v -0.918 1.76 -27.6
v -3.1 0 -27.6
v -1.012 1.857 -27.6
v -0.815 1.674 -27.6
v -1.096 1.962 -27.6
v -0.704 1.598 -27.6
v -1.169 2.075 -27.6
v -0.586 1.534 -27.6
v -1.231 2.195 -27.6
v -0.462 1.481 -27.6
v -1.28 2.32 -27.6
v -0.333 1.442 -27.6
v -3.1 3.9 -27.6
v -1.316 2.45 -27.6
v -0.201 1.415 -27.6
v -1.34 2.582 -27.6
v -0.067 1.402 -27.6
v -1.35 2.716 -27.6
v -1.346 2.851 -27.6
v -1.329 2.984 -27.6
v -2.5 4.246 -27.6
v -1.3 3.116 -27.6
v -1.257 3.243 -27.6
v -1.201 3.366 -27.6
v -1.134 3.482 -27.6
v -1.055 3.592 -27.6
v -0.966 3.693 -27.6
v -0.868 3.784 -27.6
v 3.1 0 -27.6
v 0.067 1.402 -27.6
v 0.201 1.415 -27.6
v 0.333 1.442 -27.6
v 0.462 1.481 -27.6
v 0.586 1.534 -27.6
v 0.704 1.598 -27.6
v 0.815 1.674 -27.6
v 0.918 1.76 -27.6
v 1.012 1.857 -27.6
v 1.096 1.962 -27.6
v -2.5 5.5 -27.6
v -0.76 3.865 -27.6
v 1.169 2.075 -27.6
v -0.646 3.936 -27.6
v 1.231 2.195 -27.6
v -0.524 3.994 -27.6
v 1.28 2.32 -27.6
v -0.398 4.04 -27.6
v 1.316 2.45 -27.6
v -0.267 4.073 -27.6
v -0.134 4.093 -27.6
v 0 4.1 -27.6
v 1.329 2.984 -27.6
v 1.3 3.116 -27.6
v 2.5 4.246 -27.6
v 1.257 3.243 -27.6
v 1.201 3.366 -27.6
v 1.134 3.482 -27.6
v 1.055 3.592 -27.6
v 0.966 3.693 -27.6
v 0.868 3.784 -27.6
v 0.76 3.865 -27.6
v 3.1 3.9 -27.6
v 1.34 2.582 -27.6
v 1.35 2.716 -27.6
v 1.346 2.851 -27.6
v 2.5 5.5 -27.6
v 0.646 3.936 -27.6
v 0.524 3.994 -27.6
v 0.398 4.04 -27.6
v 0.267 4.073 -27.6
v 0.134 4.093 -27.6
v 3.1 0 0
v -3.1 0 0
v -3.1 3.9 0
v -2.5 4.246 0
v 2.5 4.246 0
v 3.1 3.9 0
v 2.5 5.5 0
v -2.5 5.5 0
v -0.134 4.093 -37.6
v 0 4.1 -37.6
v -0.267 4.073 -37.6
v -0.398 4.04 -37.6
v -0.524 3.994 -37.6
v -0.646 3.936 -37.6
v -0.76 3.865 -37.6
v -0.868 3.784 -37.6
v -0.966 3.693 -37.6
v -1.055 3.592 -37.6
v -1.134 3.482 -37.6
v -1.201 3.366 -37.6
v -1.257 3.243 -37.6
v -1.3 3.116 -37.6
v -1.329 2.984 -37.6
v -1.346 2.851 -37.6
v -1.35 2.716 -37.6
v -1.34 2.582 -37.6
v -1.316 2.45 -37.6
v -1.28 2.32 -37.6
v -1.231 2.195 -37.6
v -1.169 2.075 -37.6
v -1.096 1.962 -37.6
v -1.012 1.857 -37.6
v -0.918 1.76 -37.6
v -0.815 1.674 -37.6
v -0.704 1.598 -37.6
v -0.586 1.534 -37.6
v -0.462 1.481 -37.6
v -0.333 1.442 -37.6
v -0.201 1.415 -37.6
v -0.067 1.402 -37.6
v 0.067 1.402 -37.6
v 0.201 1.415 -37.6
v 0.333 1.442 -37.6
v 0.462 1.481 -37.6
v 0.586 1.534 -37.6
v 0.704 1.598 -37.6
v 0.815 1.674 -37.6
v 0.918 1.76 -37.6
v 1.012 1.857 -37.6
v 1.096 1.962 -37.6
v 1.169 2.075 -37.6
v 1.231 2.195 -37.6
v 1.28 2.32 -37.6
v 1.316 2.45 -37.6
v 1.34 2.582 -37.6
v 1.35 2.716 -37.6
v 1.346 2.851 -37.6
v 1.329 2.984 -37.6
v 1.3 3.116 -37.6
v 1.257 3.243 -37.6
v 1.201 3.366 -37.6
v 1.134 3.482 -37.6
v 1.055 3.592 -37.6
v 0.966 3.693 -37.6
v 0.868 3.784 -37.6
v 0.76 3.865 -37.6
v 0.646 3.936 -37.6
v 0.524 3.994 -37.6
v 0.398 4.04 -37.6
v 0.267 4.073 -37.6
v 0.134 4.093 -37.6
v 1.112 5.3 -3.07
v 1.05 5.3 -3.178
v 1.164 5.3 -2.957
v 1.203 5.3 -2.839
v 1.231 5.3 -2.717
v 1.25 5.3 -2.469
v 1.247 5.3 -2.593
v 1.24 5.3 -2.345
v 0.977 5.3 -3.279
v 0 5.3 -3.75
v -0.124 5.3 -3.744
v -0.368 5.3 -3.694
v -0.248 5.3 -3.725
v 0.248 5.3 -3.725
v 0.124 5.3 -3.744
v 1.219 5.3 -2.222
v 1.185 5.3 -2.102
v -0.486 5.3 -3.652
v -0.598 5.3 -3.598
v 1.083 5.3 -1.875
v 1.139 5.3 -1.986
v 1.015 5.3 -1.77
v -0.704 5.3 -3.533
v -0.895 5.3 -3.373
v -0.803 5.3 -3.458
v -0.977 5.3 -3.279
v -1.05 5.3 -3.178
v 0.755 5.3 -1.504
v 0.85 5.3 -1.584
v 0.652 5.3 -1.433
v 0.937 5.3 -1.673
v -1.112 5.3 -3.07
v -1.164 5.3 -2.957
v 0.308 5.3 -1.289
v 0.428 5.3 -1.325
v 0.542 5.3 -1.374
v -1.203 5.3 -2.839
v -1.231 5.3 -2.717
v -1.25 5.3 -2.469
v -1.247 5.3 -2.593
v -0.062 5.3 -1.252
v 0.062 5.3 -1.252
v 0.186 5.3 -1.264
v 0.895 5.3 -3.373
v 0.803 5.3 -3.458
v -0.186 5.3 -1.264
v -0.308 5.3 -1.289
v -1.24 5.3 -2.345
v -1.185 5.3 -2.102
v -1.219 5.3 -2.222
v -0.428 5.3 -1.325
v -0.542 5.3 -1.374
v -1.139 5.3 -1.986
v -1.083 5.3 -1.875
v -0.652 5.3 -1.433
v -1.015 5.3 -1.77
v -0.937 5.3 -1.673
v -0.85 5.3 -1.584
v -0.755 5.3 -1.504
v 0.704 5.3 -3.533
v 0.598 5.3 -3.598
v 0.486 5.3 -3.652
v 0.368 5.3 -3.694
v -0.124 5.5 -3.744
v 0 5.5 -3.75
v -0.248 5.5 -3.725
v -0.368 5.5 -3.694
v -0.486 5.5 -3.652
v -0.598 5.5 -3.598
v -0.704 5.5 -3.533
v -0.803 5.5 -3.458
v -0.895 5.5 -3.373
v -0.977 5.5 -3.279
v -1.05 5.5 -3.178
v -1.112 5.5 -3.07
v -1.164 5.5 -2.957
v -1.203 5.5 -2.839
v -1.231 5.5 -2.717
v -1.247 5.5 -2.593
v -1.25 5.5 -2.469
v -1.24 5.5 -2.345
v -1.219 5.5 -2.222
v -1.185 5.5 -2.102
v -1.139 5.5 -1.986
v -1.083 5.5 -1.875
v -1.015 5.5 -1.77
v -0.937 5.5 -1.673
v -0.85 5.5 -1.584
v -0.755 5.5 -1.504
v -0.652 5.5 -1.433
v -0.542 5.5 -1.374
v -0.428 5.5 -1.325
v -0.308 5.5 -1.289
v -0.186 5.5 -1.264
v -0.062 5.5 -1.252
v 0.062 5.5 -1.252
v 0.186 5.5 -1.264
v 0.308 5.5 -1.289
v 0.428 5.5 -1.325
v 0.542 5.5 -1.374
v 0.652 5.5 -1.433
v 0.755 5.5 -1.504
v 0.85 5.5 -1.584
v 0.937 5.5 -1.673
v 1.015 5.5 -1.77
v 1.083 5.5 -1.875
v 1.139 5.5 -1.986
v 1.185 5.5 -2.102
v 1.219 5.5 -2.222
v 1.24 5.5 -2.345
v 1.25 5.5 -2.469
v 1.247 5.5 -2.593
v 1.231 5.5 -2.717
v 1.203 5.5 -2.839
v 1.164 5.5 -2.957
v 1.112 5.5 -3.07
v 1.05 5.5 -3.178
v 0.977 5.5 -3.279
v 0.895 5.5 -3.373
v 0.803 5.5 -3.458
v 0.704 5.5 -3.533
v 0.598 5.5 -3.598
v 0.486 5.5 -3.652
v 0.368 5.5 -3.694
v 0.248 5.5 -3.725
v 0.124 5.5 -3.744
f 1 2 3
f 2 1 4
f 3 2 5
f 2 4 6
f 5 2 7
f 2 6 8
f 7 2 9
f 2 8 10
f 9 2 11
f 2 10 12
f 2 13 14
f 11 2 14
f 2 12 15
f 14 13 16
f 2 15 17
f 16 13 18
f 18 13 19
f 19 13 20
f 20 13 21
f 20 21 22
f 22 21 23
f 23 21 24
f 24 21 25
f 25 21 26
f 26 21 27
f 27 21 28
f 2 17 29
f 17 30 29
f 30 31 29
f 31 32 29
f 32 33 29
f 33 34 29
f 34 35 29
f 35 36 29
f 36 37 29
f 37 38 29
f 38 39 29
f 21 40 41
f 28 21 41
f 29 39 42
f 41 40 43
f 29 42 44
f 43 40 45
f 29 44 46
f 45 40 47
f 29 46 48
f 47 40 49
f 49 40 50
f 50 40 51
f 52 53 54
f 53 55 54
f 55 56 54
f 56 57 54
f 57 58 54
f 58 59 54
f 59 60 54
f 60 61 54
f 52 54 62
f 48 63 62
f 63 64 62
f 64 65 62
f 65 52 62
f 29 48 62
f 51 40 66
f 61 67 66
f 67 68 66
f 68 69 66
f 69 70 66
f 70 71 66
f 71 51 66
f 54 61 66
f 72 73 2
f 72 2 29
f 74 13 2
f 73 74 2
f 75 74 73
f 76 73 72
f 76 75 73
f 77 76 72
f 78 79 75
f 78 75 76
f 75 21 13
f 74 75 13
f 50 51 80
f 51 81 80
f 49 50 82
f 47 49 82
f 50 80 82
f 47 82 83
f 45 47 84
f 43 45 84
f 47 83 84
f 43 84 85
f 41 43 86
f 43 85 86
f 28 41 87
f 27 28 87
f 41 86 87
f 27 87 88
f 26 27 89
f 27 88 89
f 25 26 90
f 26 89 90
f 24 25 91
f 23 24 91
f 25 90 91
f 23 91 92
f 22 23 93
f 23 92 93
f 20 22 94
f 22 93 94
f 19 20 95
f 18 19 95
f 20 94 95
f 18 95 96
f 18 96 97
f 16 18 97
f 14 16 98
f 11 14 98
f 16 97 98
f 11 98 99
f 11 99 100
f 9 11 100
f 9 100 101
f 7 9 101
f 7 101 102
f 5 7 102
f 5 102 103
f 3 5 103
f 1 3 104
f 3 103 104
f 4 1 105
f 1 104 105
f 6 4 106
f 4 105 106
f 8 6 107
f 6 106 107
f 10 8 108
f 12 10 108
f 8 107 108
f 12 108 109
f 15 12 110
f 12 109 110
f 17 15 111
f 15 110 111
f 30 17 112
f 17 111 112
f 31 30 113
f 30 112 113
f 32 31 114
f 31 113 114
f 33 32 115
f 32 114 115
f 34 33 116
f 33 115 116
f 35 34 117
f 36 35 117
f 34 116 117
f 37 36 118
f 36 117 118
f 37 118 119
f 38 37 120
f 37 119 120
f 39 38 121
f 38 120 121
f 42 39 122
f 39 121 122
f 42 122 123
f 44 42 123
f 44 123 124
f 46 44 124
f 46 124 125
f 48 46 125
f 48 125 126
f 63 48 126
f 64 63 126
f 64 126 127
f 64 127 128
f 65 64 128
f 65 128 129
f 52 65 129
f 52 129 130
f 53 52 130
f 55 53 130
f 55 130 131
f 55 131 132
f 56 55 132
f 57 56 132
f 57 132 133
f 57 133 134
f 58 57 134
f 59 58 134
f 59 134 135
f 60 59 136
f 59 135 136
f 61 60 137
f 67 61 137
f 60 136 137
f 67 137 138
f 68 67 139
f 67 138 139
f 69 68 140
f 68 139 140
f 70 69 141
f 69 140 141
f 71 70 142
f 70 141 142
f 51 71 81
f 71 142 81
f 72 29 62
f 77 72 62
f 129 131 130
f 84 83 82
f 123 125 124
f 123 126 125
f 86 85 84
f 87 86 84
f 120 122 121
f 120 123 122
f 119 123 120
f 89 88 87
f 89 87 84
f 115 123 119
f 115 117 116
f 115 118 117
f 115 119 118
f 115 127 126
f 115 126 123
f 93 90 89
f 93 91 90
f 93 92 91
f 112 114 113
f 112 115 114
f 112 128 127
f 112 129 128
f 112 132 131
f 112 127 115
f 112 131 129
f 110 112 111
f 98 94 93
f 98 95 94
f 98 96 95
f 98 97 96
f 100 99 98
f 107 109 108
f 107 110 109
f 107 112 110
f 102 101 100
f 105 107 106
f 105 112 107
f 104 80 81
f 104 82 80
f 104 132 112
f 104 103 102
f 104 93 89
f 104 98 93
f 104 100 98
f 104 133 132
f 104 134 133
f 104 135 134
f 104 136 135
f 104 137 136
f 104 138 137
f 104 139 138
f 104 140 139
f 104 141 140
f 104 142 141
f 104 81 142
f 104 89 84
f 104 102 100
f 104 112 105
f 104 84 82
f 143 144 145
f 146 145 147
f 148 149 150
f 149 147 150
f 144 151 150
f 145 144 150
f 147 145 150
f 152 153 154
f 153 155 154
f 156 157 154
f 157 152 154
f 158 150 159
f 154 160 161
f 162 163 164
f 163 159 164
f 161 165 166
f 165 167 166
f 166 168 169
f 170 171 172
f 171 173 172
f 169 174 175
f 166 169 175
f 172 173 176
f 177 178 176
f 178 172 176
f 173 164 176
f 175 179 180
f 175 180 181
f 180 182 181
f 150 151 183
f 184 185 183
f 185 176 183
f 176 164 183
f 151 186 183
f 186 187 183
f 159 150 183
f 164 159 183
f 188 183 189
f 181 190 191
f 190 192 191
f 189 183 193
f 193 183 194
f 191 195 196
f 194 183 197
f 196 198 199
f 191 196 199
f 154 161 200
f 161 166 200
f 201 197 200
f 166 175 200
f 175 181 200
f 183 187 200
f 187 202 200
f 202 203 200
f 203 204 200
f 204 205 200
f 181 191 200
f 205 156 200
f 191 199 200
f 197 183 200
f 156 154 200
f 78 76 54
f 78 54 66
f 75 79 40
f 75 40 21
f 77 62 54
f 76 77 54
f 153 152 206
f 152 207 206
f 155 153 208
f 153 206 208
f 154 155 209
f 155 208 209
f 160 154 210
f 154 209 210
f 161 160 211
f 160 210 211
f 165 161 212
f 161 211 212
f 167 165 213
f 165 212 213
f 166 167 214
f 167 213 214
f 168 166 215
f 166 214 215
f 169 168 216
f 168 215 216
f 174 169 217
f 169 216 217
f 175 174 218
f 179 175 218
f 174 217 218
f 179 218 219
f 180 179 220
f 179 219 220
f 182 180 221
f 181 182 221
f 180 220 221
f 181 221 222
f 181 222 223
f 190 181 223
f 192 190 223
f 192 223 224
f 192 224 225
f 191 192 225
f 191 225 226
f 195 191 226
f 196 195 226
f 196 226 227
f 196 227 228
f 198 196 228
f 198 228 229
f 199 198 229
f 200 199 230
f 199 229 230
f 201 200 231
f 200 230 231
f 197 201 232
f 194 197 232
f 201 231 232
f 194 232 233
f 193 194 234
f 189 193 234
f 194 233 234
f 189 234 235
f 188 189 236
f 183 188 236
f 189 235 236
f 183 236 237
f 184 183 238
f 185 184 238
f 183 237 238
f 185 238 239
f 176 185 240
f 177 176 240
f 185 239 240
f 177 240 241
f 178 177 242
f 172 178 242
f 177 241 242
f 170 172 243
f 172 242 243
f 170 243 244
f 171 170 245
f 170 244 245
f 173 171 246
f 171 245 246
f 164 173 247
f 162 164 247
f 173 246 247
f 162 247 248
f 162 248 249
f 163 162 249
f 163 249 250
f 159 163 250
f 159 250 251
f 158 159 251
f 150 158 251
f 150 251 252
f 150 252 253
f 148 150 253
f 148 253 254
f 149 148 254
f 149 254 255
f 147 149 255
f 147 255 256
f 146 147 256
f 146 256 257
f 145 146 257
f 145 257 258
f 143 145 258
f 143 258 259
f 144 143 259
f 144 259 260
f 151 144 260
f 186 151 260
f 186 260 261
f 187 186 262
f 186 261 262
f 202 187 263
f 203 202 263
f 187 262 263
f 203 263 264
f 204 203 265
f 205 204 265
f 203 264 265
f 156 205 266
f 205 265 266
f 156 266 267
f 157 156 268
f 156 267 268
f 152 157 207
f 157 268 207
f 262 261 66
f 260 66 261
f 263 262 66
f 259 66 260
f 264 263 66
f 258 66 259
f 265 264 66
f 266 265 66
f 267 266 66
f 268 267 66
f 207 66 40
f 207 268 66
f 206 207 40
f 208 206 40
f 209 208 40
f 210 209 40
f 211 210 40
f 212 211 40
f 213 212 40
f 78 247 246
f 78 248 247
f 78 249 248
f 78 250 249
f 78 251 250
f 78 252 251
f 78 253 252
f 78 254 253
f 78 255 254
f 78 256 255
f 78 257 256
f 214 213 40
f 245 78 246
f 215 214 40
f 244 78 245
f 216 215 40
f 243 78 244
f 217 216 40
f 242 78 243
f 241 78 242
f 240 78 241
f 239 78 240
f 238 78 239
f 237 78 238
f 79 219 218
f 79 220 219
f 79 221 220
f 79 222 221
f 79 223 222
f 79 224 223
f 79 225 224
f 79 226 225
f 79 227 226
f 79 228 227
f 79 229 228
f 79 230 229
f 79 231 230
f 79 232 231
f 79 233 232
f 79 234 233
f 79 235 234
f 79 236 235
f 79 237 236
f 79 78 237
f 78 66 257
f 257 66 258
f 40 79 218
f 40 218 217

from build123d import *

# Parameters (mm, degrees)
EXTRUDE_1_DEPTH = 27.6
SKETCH_2_W      = 10
SKETCH_2_H      = 1.35
SKETCH_3_W      = 1.25
SKETCH_3_H      = 0.2


with BuildPart() as part:
    # 草图1 → 凸台-拉伸1 (new body)
    with BuildSketch(Plane.XY):
        Polygon((-3.1, 0), (3.1, 0), (3.1, 3.9), (2.5, 4.246410162), (2.5, 5.5), (-2.5, 5.5), (-2.5, 4.246410162), (-3.1, 3.9), align=None)
    extrude(amount=-EXTRUDE_1_DEPTH)

    # 草图2 → 旋转1 (revolve)
    with BuildSketch(Plane(origin=(0, 0, 0), x_dir=(0, 0, -1), z_dir=(1, 0, 0))):
        with Locations((32.6, 3.425)):
            Rectangle(SKETCH_2_W, SKETCH_2_H)
    revolve(axis=Axis((0, 2.75, -37.6), (0, 0, 1)))

    # 草图3 → 切除-旋转1 (revolve, cut)
    with BuildSketch(Plane(origin=(0, 0, 0), x_dir=(0, 0, -1), z_dir=(1, 0, 0))):
        with Locations((3.125, 5.4)):
            Rectangle(SKETCH_3_W, SKETCH_3_H)
    revolve(axis=Axis((0, 5.3, -2.5), (0, 1, 0)), mode=Mode.SUBTRACT)


solid = part.part
